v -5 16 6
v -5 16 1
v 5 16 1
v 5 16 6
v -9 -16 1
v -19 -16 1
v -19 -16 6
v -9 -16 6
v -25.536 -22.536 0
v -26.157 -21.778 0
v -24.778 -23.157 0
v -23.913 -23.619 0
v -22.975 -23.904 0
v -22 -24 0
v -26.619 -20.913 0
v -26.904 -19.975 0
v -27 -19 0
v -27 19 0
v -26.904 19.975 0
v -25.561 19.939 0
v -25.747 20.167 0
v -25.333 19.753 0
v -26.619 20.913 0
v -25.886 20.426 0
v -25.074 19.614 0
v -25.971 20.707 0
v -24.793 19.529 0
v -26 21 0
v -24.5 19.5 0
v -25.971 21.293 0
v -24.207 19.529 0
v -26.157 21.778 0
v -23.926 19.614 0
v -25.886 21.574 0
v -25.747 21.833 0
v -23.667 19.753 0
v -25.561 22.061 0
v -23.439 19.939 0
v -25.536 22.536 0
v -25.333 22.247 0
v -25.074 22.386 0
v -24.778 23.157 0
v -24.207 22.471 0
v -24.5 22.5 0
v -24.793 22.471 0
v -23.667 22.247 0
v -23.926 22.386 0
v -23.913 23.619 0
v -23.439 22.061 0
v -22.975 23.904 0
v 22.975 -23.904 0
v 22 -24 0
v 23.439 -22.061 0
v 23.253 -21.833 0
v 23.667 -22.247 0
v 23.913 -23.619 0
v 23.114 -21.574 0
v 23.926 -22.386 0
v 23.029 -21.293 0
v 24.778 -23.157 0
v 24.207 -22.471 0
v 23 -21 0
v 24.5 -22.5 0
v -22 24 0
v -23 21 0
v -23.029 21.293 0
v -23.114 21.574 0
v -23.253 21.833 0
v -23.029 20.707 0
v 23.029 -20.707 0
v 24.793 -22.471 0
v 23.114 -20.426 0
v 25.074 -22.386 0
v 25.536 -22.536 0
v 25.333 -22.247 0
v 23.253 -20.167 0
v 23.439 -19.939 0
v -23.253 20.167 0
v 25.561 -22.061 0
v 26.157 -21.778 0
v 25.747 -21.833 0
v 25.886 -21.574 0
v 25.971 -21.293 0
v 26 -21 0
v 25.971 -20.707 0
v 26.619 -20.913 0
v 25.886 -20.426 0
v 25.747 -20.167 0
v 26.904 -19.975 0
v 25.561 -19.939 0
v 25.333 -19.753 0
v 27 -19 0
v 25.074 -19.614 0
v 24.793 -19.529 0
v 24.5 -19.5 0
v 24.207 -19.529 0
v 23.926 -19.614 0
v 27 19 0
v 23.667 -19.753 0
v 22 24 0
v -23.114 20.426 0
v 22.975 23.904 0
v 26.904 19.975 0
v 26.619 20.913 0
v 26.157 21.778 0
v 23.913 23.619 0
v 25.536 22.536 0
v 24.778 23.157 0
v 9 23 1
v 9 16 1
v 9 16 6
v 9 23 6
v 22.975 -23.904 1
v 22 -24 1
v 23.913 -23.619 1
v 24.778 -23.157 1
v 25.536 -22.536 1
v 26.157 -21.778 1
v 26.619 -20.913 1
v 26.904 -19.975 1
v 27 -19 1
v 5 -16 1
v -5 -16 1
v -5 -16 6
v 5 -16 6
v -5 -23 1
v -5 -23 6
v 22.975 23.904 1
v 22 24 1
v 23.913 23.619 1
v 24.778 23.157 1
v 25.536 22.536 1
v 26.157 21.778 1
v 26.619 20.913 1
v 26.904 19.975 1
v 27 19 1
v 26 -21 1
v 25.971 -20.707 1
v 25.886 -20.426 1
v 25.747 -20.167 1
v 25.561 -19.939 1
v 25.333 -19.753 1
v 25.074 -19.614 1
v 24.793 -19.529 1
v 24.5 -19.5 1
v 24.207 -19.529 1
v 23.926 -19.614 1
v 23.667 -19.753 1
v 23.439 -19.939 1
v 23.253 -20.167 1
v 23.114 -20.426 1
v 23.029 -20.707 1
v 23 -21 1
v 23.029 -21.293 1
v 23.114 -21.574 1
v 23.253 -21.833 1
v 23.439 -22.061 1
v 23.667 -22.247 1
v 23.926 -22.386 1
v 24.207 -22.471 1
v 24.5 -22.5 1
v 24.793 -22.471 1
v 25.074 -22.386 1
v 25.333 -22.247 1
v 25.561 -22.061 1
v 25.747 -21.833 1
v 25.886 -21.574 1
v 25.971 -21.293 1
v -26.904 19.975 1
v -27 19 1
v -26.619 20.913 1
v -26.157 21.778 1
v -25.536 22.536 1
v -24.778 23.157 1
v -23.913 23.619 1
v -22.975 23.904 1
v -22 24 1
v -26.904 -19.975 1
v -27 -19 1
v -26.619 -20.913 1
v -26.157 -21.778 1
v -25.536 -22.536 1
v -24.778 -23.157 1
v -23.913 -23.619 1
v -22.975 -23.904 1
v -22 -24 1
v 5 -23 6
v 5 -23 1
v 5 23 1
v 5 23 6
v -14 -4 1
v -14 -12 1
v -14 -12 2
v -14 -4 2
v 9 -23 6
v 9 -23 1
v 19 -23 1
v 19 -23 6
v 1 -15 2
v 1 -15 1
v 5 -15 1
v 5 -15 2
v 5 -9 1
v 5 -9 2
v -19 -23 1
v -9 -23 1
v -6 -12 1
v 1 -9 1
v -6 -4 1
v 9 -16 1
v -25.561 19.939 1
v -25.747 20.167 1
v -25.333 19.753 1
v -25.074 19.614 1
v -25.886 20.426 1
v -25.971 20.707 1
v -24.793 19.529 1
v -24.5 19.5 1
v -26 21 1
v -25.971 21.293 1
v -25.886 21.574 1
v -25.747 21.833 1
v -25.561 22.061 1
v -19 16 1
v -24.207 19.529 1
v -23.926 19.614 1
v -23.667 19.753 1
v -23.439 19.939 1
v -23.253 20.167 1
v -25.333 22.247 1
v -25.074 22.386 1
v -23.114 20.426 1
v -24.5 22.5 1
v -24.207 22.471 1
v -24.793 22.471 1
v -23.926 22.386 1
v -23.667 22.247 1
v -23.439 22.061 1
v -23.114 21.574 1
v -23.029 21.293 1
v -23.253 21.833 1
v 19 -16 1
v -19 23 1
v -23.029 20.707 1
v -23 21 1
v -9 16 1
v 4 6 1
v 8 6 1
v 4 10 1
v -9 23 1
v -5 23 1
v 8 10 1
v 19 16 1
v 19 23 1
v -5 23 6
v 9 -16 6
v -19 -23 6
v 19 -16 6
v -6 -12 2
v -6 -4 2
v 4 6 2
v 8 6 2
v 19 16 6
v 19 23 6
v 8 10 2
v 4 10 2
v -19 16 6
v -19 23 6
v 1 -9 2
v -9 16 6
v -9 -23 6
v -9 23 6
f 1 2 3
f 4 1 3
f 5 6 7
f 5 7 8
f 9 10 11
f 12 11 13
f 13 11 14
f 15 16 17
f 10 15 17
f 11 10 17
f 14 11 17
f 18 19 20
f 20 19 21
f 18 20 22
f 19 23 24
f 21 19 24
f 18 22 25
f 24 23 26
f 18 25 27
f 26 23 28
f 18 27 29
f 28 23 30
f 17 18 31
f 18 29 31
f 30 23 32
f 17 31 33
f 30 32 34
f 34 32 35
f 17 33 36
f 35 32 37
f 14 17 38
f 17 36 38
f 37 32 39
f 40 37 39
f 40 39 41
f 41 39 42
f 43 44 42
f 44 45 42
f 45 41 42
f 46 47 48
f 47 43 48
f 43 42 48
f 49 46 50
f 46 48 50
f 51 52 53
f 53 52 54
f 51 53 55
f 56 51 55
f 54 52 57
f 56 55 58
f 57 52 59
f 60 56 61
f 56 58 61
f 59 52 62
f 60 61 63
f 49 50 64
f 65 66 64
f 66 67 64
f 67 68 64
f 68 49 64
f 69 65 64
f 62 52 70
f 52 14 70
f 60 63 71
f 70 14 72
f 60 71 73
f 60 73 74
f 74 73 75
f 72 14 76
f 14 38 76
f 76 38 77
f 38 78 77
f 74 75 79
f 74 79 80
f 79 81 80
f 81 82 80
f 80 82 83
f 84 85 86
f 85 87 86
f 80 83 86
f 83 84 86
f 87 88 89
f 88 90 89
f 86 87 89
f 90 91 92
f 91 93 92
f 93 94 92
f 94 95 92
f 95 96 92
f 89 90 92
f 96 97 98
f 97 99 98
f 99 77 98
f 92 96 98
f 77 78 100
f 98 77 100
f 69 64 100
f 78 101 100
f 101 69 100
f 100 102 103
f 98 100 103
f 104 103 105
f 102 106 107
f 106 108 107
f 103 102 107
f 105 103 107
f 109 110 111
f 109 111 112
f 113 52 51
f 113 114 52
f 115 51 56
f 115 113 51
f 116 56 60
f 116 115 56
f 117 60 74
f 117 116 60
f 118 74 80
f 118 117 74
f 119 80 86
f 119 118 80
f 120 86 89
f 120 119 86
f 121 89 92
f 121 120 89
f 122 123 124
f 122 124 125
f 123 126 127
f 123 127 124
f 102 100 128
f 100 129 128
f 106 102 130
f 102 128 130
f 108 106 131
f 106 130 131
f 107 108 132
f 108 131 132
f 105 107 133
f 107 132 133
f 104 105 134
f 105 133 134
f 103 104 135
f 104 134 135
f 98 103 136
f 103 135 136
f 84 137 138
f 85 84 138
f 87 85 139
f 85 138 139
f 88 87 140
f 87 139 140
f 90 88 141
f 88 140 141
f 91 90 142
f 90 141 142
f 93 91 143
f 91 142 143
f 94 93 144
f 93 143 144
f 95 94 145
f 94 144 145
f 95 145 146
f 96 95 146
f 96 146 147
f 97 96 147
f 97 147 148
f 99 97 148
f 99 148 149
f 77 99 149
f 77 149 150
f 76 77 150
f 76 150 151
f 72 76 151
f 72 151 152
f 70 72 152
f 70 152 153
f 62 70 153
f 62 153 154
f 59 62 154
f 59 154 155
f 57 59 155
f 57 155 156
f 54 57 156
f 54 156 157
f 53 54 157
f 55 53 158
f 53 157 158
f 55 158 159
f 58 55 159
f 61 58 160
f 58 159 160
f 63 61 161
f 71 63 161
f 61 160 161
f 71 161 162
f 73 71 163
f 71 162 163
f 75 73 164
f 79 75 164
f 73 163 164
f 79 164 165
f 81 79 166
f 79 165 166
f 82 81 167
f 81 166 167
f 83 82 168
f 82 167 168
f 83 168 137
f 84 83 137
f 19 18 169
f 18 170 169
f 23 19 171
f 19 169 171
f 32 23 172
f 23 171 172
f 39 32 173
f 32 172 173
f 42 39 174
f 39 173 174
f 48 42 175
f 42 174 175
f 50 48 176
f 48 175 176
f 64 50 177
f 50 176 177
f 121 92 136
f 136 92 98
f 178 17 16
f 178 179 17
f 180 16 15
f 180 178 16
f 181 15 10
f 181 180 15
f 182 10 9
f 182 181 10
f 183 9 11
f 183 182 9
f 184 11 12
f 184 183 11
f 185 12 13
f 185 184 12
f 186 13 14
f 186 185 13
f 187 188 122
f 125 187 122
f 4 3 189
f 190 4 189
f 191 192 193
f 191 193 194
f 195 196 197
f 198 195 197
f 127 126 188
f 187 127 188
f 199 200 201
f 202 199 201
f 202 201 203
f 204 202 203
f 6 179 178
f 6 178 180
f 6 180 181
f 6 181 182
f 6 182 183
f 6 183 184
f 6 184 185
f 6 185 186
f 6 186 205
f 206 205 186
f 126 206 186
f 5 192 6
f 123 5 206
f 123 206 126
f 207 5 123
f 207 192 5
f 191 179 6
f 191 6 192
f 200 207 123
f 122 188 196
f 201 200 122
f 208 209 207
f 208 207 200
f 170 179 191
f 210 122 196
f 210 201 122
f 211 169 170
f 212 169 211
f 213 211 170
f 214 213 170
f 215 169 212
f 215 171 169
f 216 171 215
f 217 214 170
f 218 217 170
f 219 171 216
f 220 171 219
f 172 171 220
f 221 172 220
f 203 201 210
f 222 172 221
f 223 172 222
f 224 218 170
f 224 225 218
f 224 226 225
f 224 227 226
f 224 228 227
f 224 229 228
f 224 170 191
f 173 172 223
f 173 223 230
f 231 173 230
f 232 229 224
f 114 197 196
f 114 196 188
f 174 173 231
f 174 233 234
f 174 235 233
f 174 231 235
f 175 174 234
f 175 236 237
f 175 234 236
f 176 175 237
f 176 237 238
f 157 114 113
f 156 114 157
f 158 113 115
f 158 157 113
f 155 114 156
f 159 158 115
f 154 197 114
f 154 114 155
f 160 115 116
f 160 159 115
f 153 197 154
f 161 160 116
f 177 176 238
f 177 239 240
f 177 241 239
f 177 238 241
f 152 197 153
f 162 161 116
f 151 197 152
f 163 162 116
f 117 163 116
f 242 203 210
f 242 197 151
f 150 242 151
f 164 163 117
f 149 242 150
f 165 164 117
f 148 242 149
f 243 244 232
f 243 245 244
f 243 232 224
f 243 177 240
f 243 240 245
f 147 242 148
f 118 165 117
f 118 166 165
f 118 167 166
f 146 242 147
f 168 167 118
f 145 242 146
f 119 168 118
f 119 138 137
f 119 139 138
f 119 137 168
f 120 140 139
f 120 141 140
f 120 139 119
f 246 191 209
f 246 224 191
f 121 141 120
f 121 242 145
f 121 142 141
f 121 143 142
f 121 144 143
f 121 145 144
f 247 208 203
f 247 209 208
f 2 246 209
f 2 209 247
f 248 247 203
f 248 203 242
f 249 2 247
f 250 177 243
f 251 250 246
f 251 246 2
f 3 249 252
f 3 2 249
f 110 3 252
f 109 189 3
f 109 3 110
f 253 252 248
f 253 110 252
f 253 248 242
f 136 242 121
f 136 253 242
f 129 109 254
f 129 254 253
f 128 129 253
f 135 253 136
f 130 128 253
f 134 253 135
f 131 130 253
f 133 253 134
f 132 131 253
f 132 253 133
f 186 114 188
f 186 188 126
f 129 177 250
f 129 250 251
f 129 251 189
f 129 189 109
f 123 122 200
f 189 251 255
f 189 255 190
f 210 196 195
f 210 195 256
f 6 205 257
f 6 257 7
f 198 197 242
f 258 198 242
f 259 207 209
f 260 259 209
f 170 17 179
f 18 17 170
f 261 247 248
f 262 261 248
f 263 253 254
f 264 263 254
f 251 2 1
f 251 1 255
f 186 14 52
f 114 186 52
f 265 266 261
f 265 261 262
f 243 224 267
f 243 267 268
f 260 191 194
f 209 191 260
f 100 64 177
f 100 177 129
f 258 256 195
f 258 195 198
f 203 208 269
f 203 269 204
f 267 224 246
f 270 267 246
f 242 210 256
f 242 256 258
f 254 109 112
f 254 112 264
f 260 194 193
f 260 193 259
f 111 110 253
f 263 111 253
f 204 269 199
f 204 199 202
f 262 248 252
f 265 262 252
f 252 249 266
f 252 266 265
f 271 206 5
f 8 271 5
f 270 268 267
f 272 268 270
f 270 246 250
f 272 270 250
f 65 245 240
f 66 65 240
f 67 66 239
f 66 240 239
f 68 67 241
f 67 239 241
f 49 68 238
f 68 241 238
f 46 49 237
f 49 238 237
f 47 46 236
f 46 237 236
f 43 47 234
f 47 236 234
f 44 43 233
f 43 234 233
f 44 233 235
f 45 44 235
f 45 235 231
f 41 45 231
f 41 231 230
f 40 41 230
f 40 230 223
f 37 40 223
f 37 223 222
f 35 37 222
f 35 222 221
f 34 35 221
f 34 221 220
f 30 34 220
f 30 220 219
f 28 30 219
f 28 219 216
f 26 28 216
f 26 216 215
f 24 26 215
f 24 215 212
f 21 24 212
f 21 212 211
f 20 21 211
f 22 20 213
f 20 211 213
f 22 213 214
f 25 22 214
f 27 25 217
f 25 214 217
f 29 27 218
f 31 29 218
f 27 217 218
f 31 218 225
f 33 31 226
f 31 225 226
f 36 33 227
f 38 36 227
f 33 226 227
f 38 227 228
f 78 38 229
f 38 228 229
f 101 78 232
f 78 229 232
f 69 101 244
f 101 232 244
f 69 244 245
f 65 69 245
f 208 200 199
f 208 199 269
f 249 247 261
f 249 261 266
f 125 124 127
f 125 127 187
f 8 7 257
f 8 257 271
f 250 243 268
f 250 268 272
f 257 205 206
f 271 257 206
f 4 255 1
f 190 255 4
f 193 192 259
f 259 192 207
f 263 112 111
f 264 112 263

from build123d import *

# Parameters (mm, degrees)
SKETCH_1_W          = 54
SKETCH_1_H          = 48
EXTRUDE_1_DEPTH     = 1
SKETCH_2_R          = 1.5
CUT_EXTRUDE_1_DEPTH = 37.138621999
FILLET_1_R          = 5
SKETCH_3_W          = 10
SKETCH_3_H          = 7
EXTRUDE_2_DEPTH     = 5
SKETCH_4_W          = 8
SKETCH_4_H          = 8
SKETCH_4_W_2        = 4
SKETCH_4_H_2        = 6
SKETCH_4_H_3        = 4
EXTRUDE_3_DEPTH     = 1


with BuildPart() as part:
    # ｽｹｯﾁ1 → ﾎﾞｽ - 押し出し1 (new body)
    with BuildSketch(Plane.XY):
        Rectangle(SKETCH_1_W, SKETCH_1_H)
    extrude(amount=EXTRUDE_1_DEPTH)

    # ｽｹｯﾁ2 → ｶｯﾄ - 押し出し1 (cut, through all)
    with BuildSketch(Plane.XY.offset(1)):
        with Locations((-24.5, 21)):
            Circle(SKETCH_2_R)
        with Locations((24.5, -21)):
            Circle(SKETCH_2_R)
    extrude(amount=-CUT_EXTRUDE_1_DEPTH, mode=Mode.SUBTRACT)

    # ﾌｨﾚｯﾄ1
    fillet_1_edges = [part.edges().sort_by_distance(p)[0] for p in [
        (27, -24, 0.5),
        (-27, -24, 0.5),
        (-27, 24, 0.5),
        (27, 24, 0.5),
    ]]
    fillet(fillet_1_edges, radius=FILLET_1_R)

    # ｽｹｯﾁ3 → ﾎﾞｽ - 押し出し2 (add)
    with BuildSketch(Plane.XY.offset(1)):
        with Locations((-14, 19.5)):
            Rectangle(SKETCH_3_W, SKETCH_3_H)
        with Locations((0, 19.5)):
            Rectangle(SKETCH_3_W, SKETCH_3_H)
        with Locations((14, 19.5)):
            Rectangle(SKETCH_3_W, SKETCH_3_H)
        with Locations((-14, -19.5)):
            Rectangle(SKETCH_3_W, SKETCH_3_H)
        with Locations((0, -19.5)):
            Rectangle(SKETCH_3_W, SKETCH_3_H)
        with Locations((14, -19.5)):
            Rectangle(SKETCH_3_W, SKETCH_3_H)
    extrude(amount=EXTRUDE_2_DEPTH)

    # ｽｹｯﾁ4 → ﾎﾞｽ - 押し出し3 (add)
    with BuildSketch(Plane.XY.offset(1)):
        with Locations((-10, -8)):
            Rectangle(SKETCH_4_W, SKETCH_4_H)
        with Locations((3, -12)):
            Rectangle(SKETCH_4_W_2, SKETCH_4_H_2)
        with Locations((6, 8)):
            Rectangle(SKETCH_4_W_2, SKETCH_4_H_3)
    extrude(amount=EXTRUDE_3_DEPTH)


solid = part.part
